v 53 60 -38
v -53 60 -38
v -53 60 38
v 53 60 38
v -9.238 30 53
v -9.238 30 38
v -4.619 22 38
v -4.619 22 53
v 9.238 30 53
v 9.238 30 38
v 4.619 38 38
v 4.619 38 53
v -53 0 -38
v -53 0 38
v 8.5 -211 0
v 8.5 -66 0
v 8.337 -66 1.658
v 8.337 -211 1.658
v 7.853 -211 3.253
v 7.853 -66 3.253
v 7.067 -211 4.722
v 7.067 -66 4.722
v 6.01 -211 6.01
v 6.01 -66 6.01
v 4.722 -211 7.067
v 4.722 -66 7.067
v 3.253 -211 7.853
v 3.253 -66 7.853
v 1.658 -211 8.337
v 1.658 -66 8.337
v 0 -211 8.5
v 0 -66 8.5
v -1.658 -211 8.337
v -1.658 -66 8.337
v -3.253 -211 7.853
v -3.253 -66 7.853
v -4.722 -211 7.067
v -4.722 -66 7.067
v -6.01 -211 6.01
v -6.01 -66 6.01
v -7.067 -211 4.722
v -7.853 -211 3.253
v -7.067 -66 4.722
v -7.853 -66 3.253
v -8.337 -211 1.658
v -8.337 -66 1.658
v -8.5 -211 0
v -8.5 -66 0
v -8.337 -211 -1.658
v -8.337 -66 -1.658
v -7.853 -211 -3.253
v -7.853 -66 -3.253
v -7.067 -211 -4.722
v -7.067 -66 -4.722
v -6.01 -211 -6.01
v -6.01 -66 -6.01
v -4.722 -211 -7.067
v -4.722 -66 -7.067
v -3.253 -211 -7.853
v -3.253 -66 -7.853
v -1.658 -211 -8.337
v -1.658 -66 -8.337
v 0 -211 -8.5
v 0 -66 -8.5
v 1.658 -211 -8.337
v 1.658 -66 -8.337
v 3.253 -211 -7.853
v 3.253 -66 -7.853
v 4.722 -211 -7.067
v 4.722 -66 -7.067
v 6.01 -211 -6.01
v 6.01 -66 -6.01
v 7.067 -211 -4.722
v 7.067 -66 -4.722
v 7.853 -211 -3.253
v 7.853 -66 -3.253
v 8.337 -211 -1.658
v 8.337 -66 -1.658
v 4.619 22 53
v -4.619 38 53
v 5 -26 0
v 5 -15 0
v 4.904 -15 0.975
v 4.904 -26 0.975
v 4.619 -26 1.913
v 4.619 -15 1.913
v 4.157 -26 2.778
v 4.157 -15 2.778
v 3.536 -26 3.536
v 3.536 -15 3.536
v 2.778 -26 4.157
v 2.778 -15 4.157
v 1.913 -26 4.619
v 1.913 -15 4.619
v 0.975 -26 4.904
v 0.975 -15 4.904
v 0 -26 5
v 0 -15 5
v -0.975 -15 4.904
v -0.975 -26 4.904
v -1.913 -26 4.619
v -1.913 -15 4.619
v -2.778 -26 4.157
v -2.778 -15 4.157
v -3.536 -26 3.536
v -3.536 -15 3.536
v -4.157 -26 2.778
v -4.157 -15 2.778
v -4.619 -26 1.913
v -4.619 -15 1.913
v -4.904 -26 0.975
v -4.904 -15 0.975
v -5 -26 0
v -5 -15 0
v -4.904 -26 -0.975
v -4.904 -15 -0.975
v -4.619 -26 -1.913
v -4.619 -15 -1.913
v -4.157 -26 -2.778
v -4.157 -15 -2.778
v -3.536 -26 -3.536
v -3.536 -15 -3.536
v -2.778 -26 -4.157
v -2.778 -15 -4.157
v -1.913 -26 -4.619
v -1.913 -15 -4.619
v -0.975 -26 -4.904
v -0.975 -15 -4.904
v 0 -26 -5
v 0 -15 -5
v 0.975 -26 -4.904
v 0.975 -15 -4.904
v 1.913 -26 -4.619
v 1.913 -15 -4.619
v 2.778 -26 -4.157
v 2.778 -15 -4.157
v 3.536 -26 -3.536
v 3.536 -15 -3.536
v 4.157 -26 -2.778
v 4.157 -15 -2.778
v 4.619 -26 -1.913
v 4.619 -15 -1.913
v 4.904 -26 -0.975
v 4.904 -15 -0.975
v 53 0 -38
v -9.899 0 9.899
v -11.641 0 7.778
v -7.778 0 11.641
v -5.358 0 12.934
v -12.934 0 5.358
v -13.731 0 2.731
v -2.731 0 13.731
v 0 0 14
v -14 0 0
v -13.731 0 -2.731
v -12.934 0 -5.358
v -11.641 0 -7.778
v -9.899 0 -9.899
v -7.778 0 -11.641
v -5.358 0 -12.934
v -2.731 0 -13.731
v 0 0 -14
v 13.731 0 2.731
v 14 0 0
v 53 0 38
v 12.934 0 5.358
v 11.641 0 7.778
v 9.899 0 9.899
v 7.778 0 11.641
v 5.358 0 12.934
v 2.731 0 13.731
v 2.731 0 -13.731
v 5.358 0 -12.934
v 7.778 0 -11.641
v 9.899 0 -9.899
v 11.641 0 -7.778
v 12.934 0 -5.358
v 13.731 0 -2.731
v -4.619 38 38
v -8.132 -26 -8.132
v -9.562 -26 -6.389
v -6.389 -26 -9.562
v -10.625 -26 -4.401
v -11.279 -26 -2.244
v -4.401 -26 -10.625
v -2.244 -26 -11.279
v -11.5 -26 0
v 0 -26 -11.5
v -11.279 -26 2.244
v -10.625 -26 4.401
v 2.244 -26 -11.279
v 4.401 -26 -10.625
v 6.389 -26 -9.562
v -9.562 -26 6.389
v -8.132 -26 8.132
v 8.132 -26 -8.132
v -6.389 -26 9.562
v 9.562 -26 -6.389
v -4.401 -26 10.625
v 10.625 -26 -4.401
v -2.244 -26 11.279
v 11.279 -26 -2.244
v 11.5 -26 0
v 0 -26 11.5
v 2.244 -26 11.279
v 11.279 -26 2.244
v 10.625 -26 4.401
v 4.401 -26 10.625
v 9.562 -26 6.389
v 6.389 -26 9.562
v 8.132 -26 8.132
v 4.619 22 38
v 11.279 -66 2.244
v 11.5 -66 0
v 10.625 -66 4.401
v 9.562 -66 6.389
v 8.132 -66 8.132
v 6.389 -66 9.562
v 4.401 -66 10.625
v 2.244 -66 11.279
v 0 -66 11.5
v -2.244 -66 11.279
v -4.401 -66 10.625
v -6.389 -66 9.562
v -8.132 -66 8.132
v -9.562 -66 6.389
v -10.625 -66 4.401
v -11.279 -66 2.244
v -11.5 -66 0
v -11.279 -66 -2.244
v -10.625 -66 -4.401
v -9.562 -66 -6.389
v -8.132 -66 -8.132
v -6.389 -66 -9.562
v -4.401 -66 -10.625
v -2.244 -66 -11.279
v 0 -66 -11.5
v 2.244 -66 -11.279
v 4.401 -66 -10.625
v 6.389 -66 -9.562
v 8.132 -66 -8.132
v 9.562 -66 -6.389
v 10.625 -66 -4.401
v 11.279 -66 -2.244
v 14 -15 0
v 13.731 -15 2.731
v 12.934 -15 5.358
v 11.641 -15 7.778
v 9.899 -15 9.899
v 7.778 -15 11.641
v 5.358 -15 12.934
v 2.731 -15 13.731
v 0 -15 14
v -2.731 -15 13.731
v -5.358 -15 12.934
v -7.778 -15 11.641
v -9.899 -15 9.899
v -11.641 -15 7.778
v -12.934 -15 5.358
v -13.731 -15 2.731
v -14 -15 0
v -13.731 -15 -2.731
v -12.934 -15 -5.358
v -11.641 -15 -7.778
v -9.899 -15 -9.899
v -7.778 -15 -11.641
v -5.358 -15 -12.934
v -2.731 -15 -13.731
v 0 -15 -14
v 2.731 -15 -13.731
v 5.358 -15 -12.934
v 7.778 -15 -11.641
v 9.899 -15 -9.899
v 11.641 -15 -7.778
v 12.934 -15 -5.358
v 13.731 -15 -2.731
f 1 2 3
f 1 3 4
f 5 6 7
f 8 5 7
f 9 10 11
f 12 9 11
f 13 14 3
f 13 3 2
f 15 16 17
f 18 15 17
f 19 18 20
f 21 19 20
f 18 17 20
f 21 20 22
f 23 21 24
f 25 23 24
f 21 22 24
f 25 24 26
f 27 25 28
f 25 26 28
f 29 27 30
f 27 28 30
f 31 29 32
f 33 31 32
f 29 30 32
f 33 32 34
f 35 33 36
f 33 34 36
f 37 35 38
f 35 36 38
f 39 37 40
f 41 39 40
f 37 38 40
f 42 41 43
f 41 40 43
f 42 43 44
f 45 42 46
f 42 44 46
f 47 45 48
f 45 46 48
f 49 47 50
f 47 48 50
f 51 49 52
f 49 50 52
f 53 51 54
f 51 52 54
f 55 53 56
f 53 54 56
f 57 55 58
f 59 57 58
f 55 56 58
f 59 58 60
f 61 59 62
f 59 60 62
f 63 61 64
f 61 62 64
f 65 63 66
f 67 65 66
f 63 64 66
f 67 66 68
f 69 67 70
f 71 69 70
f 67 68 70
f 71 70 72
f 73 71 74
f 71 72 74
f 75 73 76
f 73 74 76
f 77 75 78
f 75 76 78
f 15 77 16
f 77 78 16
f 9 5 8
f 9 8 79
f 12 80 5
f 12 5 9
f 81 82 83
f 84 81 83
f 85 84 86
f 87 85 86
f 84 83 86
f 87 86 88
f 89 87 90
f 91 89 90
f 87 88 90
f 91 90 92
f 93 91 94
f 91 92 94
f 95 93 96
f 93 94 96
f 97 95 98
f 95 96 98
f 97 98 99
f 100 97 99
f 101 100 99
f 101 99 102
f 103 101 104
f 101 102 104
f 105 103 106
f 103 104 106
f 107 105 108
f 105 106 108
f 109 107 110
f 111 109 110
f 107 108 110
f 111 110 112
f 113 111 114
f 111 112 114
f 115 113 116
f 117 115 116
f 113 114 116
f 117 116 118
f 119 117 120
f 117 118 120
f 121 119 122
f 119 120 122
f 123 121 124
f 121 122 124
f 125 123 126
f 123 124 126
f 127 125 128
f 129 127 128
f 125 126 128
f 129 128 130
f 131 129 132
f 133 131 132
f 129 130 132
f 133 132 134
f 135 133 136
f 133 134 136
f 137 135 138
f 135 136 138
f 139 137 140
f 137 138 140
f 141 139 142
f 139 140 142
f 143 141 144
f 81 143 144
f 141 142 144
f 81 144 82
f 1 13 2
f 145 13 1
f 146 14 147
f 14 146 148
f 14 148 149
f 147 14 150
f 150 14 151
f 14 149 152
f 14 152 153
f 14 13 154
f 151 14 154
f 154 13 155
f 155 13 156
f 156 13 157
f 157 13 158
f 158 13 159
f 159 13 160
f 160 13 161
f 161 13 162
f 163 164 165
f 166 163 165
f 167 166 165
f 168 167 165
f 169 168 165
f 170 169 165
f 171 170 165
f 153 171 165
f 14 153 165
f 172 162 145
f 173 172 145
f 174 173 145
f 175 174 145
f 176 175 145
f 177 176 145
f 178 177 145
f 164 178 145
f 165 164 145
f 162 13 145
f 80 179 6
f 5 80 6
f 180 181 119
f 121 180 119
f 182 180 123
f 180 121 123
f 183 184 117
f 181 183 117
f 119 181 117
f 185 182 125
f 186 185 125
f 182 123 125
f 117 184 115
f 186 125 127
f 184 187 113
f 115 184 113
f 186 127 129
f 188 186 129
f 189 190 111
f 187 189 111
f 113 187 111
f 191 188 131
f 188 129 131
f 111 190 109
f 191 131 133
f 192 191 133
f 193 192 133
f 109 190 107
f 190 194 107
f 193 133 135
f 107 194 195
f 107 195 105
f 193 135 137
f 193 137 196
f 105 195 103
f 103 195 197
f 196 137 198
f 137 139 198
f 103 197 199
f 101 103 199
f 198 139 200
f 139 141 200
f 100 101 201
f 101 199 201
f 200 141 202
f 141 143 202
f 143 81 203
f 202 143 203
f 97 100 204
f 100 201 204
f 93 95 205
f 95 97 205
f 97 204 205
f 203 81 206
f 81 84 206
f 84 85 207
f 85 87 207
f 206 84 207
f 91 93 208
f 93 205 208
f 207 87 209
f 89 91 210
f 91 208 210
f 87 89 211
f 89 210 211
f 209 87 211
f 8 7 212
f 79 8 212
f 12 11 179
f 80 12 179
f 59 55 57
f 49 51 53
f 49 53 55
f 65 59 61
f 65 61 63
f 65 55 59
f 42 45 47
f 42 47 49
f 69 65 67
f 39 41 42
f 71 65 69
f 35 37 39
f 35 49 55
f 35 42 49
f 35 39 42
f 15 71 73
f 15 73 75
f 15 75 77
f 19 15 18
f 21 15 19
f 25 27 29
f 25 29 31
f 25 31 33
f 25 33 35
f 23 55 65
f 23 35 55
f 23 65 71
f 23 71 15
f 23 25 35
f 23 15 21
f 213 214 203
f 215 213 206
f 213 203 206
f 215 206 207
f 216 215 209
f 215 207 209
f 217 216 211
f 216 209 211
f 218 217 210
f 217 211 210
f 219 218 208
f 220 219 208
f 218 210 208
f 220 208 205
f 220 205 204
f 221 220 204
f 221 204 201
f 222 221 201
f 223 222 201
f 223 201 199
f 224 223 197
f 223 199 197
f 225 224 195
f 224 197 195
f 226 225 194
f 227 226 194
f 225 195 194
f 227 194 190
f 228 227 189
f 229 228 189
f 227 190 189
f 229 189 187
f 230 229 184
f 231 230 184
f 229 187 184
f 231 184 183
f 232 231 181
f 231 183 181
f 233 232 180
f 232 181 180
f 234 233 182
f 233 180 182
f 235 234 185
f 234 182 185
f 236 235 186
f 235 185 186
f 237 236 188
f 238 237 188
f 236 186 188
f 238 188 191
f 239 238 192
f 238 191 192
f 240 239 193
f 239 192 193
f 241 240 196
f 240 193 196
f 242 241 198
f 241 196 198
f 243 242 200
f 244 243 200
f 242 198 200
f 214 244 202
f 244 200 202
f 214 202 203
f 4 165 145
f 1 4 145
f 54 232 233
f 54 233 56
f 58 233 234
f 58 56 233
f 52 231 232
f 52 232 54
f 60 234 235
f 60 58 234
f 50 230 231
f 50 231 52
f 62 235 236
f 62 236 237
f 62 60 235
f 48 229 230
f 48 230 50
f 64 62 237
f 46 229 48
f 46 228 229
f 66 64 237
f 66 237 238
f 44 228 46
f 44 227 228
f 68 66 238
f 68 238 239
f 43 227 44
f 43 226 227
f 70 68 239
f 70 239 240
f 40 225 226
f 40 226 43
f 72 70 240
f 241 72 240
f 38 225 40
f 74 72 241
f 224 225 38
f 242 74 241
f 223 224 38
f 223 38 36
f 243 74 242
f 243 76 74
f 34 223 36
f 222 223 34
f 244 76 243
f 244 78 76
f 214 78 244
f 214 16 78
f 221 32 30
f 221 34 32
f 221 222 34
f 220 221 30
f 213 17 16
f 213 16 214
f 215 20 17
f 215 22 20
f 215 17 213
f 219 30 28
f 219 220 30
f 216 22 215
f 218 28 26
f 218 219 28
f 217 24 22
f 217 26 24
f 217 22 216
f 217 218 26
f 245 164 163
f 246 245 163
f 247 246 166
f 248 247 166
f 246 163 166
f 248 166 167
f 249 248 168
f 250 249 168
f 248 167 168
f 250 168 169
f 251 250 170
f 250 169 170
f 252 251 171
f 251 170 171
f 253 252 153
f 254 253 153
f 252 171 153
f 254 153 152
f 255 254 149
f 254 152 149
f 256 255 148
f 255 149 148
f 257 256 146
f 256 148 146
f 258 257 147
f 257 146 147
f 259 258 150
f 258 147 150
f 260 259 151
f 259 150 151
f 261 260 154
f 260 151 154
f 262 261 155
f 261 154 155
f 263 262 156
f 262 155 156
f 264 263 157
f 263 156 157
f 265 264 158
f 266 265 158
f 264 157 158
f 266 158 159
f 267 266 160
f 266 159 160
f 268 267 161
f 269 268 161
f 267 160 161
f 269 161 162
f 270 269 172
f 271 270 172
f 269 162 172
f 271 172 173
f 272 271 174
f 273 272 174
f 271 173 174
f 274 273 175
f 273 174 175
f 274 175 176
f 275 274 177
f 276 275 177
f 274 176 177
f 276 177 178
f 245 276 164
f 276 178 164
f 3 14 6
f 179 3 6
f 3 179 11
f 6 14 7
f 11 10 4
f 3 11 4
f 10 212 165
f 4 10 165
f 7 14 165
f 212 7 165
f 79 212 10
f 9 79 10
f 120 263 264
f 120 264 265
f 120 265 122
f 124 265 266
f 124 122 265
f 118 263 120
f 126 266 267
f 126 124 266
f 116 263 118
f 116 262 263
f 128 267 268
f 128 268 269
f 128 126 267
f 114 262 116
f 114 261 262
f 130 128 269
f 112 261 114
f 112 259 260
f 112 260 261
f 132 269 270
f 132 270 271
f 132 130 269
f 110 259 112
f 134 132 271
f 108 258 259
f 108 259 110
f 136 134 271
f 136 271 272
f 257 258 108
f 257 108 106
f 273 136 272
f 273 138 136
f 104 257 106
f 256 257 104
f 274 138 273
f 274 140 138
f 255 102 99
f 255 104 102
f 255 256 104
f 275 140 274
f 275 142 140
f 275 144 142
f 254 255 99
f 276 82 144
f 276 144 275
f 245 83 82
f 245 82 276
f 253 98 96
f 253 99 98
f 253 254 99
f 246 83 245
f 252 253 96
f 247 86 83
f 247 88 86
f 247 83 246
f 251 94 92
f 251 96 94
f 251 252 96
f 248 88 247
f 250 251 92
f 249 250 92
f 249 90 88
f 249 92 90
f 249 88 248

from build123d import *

# Parameters (mm, degrees)
SKETCH1_W           = 106
SKETCH1_H           = 76
BOSS_EXTRUDE1_DEPTH = 60
BOSS_EXTRUDE2_DEPTH = 15
SKETCH3_R           = 14
BOSS_EXTRUDE3_DEPTH = 15
SKETCH4_R           = 5
BOSS_EXTRUDE4_DEPTH = 11
SKETCH5_R           = 11.5
BOSS_EXTRUDE5_DEPTH = 40
SKETCH6_R           = 8.5
BOSS_EXTRUDE6_DEPTH = 145


with BuildPart() as part:
    # Sketch1 → Boss-Extrude1 (new body)
    with BuildSketch(Plane(origin=(0, 0, 0), x_dir=(1, 0, 0), z_dir=(0, 1, 0))):
        Rectangle(SKETCH1_W, SKETCH1_H)
    extrude(amount=BOSS_EXTRUDE1_DEPTH)

    # Sketch2 → Boss-Extrude2 (add)
    with BuildSketch(Plane.XY.offset(38)):
        Polygon((9.237604307, 30), (4.618802154, 38), (-4.618802154, 38), (-9.237604307, 30), (-4.618802154, 22), (4.618802154, 22), align=None)
    extrude(amount=BOSS_EXTRUDE2_DEPTH)

    # Sketch3 → Boss-Extrude3 (add)
    with BuildSketch(Plane.XZ):
        Circle(SKETCH3_R)
    extrude(amount=BOSS_EXTRUDE3_DEPTH)

    # Sketch4 → Boss-Extrude4 (add)
    with BuildSketch(Plane.XZ.offset(15)):
        Circle(SKETCH4_R)
    extrude(amount=BOSS_EXTRUDE4_DEPTH)

    # Sketch5 → Boss-Extrude5 (add)
    with BuildSketch(Plane.XZ.offset(26)):
        Circle(SKETCH5_R)
    extrude(amount=BOSS_EXTRUDE5_DEPTH)

    # Sketch6 → Boss-Extrude6 (add)
    with BuildSketch(Plane.XZ.offset(66)):
        Circle(SKETCH6_R)
    extrude(amount=BOSS_EXTRUDE6_DEPTH)


solid = part.part
